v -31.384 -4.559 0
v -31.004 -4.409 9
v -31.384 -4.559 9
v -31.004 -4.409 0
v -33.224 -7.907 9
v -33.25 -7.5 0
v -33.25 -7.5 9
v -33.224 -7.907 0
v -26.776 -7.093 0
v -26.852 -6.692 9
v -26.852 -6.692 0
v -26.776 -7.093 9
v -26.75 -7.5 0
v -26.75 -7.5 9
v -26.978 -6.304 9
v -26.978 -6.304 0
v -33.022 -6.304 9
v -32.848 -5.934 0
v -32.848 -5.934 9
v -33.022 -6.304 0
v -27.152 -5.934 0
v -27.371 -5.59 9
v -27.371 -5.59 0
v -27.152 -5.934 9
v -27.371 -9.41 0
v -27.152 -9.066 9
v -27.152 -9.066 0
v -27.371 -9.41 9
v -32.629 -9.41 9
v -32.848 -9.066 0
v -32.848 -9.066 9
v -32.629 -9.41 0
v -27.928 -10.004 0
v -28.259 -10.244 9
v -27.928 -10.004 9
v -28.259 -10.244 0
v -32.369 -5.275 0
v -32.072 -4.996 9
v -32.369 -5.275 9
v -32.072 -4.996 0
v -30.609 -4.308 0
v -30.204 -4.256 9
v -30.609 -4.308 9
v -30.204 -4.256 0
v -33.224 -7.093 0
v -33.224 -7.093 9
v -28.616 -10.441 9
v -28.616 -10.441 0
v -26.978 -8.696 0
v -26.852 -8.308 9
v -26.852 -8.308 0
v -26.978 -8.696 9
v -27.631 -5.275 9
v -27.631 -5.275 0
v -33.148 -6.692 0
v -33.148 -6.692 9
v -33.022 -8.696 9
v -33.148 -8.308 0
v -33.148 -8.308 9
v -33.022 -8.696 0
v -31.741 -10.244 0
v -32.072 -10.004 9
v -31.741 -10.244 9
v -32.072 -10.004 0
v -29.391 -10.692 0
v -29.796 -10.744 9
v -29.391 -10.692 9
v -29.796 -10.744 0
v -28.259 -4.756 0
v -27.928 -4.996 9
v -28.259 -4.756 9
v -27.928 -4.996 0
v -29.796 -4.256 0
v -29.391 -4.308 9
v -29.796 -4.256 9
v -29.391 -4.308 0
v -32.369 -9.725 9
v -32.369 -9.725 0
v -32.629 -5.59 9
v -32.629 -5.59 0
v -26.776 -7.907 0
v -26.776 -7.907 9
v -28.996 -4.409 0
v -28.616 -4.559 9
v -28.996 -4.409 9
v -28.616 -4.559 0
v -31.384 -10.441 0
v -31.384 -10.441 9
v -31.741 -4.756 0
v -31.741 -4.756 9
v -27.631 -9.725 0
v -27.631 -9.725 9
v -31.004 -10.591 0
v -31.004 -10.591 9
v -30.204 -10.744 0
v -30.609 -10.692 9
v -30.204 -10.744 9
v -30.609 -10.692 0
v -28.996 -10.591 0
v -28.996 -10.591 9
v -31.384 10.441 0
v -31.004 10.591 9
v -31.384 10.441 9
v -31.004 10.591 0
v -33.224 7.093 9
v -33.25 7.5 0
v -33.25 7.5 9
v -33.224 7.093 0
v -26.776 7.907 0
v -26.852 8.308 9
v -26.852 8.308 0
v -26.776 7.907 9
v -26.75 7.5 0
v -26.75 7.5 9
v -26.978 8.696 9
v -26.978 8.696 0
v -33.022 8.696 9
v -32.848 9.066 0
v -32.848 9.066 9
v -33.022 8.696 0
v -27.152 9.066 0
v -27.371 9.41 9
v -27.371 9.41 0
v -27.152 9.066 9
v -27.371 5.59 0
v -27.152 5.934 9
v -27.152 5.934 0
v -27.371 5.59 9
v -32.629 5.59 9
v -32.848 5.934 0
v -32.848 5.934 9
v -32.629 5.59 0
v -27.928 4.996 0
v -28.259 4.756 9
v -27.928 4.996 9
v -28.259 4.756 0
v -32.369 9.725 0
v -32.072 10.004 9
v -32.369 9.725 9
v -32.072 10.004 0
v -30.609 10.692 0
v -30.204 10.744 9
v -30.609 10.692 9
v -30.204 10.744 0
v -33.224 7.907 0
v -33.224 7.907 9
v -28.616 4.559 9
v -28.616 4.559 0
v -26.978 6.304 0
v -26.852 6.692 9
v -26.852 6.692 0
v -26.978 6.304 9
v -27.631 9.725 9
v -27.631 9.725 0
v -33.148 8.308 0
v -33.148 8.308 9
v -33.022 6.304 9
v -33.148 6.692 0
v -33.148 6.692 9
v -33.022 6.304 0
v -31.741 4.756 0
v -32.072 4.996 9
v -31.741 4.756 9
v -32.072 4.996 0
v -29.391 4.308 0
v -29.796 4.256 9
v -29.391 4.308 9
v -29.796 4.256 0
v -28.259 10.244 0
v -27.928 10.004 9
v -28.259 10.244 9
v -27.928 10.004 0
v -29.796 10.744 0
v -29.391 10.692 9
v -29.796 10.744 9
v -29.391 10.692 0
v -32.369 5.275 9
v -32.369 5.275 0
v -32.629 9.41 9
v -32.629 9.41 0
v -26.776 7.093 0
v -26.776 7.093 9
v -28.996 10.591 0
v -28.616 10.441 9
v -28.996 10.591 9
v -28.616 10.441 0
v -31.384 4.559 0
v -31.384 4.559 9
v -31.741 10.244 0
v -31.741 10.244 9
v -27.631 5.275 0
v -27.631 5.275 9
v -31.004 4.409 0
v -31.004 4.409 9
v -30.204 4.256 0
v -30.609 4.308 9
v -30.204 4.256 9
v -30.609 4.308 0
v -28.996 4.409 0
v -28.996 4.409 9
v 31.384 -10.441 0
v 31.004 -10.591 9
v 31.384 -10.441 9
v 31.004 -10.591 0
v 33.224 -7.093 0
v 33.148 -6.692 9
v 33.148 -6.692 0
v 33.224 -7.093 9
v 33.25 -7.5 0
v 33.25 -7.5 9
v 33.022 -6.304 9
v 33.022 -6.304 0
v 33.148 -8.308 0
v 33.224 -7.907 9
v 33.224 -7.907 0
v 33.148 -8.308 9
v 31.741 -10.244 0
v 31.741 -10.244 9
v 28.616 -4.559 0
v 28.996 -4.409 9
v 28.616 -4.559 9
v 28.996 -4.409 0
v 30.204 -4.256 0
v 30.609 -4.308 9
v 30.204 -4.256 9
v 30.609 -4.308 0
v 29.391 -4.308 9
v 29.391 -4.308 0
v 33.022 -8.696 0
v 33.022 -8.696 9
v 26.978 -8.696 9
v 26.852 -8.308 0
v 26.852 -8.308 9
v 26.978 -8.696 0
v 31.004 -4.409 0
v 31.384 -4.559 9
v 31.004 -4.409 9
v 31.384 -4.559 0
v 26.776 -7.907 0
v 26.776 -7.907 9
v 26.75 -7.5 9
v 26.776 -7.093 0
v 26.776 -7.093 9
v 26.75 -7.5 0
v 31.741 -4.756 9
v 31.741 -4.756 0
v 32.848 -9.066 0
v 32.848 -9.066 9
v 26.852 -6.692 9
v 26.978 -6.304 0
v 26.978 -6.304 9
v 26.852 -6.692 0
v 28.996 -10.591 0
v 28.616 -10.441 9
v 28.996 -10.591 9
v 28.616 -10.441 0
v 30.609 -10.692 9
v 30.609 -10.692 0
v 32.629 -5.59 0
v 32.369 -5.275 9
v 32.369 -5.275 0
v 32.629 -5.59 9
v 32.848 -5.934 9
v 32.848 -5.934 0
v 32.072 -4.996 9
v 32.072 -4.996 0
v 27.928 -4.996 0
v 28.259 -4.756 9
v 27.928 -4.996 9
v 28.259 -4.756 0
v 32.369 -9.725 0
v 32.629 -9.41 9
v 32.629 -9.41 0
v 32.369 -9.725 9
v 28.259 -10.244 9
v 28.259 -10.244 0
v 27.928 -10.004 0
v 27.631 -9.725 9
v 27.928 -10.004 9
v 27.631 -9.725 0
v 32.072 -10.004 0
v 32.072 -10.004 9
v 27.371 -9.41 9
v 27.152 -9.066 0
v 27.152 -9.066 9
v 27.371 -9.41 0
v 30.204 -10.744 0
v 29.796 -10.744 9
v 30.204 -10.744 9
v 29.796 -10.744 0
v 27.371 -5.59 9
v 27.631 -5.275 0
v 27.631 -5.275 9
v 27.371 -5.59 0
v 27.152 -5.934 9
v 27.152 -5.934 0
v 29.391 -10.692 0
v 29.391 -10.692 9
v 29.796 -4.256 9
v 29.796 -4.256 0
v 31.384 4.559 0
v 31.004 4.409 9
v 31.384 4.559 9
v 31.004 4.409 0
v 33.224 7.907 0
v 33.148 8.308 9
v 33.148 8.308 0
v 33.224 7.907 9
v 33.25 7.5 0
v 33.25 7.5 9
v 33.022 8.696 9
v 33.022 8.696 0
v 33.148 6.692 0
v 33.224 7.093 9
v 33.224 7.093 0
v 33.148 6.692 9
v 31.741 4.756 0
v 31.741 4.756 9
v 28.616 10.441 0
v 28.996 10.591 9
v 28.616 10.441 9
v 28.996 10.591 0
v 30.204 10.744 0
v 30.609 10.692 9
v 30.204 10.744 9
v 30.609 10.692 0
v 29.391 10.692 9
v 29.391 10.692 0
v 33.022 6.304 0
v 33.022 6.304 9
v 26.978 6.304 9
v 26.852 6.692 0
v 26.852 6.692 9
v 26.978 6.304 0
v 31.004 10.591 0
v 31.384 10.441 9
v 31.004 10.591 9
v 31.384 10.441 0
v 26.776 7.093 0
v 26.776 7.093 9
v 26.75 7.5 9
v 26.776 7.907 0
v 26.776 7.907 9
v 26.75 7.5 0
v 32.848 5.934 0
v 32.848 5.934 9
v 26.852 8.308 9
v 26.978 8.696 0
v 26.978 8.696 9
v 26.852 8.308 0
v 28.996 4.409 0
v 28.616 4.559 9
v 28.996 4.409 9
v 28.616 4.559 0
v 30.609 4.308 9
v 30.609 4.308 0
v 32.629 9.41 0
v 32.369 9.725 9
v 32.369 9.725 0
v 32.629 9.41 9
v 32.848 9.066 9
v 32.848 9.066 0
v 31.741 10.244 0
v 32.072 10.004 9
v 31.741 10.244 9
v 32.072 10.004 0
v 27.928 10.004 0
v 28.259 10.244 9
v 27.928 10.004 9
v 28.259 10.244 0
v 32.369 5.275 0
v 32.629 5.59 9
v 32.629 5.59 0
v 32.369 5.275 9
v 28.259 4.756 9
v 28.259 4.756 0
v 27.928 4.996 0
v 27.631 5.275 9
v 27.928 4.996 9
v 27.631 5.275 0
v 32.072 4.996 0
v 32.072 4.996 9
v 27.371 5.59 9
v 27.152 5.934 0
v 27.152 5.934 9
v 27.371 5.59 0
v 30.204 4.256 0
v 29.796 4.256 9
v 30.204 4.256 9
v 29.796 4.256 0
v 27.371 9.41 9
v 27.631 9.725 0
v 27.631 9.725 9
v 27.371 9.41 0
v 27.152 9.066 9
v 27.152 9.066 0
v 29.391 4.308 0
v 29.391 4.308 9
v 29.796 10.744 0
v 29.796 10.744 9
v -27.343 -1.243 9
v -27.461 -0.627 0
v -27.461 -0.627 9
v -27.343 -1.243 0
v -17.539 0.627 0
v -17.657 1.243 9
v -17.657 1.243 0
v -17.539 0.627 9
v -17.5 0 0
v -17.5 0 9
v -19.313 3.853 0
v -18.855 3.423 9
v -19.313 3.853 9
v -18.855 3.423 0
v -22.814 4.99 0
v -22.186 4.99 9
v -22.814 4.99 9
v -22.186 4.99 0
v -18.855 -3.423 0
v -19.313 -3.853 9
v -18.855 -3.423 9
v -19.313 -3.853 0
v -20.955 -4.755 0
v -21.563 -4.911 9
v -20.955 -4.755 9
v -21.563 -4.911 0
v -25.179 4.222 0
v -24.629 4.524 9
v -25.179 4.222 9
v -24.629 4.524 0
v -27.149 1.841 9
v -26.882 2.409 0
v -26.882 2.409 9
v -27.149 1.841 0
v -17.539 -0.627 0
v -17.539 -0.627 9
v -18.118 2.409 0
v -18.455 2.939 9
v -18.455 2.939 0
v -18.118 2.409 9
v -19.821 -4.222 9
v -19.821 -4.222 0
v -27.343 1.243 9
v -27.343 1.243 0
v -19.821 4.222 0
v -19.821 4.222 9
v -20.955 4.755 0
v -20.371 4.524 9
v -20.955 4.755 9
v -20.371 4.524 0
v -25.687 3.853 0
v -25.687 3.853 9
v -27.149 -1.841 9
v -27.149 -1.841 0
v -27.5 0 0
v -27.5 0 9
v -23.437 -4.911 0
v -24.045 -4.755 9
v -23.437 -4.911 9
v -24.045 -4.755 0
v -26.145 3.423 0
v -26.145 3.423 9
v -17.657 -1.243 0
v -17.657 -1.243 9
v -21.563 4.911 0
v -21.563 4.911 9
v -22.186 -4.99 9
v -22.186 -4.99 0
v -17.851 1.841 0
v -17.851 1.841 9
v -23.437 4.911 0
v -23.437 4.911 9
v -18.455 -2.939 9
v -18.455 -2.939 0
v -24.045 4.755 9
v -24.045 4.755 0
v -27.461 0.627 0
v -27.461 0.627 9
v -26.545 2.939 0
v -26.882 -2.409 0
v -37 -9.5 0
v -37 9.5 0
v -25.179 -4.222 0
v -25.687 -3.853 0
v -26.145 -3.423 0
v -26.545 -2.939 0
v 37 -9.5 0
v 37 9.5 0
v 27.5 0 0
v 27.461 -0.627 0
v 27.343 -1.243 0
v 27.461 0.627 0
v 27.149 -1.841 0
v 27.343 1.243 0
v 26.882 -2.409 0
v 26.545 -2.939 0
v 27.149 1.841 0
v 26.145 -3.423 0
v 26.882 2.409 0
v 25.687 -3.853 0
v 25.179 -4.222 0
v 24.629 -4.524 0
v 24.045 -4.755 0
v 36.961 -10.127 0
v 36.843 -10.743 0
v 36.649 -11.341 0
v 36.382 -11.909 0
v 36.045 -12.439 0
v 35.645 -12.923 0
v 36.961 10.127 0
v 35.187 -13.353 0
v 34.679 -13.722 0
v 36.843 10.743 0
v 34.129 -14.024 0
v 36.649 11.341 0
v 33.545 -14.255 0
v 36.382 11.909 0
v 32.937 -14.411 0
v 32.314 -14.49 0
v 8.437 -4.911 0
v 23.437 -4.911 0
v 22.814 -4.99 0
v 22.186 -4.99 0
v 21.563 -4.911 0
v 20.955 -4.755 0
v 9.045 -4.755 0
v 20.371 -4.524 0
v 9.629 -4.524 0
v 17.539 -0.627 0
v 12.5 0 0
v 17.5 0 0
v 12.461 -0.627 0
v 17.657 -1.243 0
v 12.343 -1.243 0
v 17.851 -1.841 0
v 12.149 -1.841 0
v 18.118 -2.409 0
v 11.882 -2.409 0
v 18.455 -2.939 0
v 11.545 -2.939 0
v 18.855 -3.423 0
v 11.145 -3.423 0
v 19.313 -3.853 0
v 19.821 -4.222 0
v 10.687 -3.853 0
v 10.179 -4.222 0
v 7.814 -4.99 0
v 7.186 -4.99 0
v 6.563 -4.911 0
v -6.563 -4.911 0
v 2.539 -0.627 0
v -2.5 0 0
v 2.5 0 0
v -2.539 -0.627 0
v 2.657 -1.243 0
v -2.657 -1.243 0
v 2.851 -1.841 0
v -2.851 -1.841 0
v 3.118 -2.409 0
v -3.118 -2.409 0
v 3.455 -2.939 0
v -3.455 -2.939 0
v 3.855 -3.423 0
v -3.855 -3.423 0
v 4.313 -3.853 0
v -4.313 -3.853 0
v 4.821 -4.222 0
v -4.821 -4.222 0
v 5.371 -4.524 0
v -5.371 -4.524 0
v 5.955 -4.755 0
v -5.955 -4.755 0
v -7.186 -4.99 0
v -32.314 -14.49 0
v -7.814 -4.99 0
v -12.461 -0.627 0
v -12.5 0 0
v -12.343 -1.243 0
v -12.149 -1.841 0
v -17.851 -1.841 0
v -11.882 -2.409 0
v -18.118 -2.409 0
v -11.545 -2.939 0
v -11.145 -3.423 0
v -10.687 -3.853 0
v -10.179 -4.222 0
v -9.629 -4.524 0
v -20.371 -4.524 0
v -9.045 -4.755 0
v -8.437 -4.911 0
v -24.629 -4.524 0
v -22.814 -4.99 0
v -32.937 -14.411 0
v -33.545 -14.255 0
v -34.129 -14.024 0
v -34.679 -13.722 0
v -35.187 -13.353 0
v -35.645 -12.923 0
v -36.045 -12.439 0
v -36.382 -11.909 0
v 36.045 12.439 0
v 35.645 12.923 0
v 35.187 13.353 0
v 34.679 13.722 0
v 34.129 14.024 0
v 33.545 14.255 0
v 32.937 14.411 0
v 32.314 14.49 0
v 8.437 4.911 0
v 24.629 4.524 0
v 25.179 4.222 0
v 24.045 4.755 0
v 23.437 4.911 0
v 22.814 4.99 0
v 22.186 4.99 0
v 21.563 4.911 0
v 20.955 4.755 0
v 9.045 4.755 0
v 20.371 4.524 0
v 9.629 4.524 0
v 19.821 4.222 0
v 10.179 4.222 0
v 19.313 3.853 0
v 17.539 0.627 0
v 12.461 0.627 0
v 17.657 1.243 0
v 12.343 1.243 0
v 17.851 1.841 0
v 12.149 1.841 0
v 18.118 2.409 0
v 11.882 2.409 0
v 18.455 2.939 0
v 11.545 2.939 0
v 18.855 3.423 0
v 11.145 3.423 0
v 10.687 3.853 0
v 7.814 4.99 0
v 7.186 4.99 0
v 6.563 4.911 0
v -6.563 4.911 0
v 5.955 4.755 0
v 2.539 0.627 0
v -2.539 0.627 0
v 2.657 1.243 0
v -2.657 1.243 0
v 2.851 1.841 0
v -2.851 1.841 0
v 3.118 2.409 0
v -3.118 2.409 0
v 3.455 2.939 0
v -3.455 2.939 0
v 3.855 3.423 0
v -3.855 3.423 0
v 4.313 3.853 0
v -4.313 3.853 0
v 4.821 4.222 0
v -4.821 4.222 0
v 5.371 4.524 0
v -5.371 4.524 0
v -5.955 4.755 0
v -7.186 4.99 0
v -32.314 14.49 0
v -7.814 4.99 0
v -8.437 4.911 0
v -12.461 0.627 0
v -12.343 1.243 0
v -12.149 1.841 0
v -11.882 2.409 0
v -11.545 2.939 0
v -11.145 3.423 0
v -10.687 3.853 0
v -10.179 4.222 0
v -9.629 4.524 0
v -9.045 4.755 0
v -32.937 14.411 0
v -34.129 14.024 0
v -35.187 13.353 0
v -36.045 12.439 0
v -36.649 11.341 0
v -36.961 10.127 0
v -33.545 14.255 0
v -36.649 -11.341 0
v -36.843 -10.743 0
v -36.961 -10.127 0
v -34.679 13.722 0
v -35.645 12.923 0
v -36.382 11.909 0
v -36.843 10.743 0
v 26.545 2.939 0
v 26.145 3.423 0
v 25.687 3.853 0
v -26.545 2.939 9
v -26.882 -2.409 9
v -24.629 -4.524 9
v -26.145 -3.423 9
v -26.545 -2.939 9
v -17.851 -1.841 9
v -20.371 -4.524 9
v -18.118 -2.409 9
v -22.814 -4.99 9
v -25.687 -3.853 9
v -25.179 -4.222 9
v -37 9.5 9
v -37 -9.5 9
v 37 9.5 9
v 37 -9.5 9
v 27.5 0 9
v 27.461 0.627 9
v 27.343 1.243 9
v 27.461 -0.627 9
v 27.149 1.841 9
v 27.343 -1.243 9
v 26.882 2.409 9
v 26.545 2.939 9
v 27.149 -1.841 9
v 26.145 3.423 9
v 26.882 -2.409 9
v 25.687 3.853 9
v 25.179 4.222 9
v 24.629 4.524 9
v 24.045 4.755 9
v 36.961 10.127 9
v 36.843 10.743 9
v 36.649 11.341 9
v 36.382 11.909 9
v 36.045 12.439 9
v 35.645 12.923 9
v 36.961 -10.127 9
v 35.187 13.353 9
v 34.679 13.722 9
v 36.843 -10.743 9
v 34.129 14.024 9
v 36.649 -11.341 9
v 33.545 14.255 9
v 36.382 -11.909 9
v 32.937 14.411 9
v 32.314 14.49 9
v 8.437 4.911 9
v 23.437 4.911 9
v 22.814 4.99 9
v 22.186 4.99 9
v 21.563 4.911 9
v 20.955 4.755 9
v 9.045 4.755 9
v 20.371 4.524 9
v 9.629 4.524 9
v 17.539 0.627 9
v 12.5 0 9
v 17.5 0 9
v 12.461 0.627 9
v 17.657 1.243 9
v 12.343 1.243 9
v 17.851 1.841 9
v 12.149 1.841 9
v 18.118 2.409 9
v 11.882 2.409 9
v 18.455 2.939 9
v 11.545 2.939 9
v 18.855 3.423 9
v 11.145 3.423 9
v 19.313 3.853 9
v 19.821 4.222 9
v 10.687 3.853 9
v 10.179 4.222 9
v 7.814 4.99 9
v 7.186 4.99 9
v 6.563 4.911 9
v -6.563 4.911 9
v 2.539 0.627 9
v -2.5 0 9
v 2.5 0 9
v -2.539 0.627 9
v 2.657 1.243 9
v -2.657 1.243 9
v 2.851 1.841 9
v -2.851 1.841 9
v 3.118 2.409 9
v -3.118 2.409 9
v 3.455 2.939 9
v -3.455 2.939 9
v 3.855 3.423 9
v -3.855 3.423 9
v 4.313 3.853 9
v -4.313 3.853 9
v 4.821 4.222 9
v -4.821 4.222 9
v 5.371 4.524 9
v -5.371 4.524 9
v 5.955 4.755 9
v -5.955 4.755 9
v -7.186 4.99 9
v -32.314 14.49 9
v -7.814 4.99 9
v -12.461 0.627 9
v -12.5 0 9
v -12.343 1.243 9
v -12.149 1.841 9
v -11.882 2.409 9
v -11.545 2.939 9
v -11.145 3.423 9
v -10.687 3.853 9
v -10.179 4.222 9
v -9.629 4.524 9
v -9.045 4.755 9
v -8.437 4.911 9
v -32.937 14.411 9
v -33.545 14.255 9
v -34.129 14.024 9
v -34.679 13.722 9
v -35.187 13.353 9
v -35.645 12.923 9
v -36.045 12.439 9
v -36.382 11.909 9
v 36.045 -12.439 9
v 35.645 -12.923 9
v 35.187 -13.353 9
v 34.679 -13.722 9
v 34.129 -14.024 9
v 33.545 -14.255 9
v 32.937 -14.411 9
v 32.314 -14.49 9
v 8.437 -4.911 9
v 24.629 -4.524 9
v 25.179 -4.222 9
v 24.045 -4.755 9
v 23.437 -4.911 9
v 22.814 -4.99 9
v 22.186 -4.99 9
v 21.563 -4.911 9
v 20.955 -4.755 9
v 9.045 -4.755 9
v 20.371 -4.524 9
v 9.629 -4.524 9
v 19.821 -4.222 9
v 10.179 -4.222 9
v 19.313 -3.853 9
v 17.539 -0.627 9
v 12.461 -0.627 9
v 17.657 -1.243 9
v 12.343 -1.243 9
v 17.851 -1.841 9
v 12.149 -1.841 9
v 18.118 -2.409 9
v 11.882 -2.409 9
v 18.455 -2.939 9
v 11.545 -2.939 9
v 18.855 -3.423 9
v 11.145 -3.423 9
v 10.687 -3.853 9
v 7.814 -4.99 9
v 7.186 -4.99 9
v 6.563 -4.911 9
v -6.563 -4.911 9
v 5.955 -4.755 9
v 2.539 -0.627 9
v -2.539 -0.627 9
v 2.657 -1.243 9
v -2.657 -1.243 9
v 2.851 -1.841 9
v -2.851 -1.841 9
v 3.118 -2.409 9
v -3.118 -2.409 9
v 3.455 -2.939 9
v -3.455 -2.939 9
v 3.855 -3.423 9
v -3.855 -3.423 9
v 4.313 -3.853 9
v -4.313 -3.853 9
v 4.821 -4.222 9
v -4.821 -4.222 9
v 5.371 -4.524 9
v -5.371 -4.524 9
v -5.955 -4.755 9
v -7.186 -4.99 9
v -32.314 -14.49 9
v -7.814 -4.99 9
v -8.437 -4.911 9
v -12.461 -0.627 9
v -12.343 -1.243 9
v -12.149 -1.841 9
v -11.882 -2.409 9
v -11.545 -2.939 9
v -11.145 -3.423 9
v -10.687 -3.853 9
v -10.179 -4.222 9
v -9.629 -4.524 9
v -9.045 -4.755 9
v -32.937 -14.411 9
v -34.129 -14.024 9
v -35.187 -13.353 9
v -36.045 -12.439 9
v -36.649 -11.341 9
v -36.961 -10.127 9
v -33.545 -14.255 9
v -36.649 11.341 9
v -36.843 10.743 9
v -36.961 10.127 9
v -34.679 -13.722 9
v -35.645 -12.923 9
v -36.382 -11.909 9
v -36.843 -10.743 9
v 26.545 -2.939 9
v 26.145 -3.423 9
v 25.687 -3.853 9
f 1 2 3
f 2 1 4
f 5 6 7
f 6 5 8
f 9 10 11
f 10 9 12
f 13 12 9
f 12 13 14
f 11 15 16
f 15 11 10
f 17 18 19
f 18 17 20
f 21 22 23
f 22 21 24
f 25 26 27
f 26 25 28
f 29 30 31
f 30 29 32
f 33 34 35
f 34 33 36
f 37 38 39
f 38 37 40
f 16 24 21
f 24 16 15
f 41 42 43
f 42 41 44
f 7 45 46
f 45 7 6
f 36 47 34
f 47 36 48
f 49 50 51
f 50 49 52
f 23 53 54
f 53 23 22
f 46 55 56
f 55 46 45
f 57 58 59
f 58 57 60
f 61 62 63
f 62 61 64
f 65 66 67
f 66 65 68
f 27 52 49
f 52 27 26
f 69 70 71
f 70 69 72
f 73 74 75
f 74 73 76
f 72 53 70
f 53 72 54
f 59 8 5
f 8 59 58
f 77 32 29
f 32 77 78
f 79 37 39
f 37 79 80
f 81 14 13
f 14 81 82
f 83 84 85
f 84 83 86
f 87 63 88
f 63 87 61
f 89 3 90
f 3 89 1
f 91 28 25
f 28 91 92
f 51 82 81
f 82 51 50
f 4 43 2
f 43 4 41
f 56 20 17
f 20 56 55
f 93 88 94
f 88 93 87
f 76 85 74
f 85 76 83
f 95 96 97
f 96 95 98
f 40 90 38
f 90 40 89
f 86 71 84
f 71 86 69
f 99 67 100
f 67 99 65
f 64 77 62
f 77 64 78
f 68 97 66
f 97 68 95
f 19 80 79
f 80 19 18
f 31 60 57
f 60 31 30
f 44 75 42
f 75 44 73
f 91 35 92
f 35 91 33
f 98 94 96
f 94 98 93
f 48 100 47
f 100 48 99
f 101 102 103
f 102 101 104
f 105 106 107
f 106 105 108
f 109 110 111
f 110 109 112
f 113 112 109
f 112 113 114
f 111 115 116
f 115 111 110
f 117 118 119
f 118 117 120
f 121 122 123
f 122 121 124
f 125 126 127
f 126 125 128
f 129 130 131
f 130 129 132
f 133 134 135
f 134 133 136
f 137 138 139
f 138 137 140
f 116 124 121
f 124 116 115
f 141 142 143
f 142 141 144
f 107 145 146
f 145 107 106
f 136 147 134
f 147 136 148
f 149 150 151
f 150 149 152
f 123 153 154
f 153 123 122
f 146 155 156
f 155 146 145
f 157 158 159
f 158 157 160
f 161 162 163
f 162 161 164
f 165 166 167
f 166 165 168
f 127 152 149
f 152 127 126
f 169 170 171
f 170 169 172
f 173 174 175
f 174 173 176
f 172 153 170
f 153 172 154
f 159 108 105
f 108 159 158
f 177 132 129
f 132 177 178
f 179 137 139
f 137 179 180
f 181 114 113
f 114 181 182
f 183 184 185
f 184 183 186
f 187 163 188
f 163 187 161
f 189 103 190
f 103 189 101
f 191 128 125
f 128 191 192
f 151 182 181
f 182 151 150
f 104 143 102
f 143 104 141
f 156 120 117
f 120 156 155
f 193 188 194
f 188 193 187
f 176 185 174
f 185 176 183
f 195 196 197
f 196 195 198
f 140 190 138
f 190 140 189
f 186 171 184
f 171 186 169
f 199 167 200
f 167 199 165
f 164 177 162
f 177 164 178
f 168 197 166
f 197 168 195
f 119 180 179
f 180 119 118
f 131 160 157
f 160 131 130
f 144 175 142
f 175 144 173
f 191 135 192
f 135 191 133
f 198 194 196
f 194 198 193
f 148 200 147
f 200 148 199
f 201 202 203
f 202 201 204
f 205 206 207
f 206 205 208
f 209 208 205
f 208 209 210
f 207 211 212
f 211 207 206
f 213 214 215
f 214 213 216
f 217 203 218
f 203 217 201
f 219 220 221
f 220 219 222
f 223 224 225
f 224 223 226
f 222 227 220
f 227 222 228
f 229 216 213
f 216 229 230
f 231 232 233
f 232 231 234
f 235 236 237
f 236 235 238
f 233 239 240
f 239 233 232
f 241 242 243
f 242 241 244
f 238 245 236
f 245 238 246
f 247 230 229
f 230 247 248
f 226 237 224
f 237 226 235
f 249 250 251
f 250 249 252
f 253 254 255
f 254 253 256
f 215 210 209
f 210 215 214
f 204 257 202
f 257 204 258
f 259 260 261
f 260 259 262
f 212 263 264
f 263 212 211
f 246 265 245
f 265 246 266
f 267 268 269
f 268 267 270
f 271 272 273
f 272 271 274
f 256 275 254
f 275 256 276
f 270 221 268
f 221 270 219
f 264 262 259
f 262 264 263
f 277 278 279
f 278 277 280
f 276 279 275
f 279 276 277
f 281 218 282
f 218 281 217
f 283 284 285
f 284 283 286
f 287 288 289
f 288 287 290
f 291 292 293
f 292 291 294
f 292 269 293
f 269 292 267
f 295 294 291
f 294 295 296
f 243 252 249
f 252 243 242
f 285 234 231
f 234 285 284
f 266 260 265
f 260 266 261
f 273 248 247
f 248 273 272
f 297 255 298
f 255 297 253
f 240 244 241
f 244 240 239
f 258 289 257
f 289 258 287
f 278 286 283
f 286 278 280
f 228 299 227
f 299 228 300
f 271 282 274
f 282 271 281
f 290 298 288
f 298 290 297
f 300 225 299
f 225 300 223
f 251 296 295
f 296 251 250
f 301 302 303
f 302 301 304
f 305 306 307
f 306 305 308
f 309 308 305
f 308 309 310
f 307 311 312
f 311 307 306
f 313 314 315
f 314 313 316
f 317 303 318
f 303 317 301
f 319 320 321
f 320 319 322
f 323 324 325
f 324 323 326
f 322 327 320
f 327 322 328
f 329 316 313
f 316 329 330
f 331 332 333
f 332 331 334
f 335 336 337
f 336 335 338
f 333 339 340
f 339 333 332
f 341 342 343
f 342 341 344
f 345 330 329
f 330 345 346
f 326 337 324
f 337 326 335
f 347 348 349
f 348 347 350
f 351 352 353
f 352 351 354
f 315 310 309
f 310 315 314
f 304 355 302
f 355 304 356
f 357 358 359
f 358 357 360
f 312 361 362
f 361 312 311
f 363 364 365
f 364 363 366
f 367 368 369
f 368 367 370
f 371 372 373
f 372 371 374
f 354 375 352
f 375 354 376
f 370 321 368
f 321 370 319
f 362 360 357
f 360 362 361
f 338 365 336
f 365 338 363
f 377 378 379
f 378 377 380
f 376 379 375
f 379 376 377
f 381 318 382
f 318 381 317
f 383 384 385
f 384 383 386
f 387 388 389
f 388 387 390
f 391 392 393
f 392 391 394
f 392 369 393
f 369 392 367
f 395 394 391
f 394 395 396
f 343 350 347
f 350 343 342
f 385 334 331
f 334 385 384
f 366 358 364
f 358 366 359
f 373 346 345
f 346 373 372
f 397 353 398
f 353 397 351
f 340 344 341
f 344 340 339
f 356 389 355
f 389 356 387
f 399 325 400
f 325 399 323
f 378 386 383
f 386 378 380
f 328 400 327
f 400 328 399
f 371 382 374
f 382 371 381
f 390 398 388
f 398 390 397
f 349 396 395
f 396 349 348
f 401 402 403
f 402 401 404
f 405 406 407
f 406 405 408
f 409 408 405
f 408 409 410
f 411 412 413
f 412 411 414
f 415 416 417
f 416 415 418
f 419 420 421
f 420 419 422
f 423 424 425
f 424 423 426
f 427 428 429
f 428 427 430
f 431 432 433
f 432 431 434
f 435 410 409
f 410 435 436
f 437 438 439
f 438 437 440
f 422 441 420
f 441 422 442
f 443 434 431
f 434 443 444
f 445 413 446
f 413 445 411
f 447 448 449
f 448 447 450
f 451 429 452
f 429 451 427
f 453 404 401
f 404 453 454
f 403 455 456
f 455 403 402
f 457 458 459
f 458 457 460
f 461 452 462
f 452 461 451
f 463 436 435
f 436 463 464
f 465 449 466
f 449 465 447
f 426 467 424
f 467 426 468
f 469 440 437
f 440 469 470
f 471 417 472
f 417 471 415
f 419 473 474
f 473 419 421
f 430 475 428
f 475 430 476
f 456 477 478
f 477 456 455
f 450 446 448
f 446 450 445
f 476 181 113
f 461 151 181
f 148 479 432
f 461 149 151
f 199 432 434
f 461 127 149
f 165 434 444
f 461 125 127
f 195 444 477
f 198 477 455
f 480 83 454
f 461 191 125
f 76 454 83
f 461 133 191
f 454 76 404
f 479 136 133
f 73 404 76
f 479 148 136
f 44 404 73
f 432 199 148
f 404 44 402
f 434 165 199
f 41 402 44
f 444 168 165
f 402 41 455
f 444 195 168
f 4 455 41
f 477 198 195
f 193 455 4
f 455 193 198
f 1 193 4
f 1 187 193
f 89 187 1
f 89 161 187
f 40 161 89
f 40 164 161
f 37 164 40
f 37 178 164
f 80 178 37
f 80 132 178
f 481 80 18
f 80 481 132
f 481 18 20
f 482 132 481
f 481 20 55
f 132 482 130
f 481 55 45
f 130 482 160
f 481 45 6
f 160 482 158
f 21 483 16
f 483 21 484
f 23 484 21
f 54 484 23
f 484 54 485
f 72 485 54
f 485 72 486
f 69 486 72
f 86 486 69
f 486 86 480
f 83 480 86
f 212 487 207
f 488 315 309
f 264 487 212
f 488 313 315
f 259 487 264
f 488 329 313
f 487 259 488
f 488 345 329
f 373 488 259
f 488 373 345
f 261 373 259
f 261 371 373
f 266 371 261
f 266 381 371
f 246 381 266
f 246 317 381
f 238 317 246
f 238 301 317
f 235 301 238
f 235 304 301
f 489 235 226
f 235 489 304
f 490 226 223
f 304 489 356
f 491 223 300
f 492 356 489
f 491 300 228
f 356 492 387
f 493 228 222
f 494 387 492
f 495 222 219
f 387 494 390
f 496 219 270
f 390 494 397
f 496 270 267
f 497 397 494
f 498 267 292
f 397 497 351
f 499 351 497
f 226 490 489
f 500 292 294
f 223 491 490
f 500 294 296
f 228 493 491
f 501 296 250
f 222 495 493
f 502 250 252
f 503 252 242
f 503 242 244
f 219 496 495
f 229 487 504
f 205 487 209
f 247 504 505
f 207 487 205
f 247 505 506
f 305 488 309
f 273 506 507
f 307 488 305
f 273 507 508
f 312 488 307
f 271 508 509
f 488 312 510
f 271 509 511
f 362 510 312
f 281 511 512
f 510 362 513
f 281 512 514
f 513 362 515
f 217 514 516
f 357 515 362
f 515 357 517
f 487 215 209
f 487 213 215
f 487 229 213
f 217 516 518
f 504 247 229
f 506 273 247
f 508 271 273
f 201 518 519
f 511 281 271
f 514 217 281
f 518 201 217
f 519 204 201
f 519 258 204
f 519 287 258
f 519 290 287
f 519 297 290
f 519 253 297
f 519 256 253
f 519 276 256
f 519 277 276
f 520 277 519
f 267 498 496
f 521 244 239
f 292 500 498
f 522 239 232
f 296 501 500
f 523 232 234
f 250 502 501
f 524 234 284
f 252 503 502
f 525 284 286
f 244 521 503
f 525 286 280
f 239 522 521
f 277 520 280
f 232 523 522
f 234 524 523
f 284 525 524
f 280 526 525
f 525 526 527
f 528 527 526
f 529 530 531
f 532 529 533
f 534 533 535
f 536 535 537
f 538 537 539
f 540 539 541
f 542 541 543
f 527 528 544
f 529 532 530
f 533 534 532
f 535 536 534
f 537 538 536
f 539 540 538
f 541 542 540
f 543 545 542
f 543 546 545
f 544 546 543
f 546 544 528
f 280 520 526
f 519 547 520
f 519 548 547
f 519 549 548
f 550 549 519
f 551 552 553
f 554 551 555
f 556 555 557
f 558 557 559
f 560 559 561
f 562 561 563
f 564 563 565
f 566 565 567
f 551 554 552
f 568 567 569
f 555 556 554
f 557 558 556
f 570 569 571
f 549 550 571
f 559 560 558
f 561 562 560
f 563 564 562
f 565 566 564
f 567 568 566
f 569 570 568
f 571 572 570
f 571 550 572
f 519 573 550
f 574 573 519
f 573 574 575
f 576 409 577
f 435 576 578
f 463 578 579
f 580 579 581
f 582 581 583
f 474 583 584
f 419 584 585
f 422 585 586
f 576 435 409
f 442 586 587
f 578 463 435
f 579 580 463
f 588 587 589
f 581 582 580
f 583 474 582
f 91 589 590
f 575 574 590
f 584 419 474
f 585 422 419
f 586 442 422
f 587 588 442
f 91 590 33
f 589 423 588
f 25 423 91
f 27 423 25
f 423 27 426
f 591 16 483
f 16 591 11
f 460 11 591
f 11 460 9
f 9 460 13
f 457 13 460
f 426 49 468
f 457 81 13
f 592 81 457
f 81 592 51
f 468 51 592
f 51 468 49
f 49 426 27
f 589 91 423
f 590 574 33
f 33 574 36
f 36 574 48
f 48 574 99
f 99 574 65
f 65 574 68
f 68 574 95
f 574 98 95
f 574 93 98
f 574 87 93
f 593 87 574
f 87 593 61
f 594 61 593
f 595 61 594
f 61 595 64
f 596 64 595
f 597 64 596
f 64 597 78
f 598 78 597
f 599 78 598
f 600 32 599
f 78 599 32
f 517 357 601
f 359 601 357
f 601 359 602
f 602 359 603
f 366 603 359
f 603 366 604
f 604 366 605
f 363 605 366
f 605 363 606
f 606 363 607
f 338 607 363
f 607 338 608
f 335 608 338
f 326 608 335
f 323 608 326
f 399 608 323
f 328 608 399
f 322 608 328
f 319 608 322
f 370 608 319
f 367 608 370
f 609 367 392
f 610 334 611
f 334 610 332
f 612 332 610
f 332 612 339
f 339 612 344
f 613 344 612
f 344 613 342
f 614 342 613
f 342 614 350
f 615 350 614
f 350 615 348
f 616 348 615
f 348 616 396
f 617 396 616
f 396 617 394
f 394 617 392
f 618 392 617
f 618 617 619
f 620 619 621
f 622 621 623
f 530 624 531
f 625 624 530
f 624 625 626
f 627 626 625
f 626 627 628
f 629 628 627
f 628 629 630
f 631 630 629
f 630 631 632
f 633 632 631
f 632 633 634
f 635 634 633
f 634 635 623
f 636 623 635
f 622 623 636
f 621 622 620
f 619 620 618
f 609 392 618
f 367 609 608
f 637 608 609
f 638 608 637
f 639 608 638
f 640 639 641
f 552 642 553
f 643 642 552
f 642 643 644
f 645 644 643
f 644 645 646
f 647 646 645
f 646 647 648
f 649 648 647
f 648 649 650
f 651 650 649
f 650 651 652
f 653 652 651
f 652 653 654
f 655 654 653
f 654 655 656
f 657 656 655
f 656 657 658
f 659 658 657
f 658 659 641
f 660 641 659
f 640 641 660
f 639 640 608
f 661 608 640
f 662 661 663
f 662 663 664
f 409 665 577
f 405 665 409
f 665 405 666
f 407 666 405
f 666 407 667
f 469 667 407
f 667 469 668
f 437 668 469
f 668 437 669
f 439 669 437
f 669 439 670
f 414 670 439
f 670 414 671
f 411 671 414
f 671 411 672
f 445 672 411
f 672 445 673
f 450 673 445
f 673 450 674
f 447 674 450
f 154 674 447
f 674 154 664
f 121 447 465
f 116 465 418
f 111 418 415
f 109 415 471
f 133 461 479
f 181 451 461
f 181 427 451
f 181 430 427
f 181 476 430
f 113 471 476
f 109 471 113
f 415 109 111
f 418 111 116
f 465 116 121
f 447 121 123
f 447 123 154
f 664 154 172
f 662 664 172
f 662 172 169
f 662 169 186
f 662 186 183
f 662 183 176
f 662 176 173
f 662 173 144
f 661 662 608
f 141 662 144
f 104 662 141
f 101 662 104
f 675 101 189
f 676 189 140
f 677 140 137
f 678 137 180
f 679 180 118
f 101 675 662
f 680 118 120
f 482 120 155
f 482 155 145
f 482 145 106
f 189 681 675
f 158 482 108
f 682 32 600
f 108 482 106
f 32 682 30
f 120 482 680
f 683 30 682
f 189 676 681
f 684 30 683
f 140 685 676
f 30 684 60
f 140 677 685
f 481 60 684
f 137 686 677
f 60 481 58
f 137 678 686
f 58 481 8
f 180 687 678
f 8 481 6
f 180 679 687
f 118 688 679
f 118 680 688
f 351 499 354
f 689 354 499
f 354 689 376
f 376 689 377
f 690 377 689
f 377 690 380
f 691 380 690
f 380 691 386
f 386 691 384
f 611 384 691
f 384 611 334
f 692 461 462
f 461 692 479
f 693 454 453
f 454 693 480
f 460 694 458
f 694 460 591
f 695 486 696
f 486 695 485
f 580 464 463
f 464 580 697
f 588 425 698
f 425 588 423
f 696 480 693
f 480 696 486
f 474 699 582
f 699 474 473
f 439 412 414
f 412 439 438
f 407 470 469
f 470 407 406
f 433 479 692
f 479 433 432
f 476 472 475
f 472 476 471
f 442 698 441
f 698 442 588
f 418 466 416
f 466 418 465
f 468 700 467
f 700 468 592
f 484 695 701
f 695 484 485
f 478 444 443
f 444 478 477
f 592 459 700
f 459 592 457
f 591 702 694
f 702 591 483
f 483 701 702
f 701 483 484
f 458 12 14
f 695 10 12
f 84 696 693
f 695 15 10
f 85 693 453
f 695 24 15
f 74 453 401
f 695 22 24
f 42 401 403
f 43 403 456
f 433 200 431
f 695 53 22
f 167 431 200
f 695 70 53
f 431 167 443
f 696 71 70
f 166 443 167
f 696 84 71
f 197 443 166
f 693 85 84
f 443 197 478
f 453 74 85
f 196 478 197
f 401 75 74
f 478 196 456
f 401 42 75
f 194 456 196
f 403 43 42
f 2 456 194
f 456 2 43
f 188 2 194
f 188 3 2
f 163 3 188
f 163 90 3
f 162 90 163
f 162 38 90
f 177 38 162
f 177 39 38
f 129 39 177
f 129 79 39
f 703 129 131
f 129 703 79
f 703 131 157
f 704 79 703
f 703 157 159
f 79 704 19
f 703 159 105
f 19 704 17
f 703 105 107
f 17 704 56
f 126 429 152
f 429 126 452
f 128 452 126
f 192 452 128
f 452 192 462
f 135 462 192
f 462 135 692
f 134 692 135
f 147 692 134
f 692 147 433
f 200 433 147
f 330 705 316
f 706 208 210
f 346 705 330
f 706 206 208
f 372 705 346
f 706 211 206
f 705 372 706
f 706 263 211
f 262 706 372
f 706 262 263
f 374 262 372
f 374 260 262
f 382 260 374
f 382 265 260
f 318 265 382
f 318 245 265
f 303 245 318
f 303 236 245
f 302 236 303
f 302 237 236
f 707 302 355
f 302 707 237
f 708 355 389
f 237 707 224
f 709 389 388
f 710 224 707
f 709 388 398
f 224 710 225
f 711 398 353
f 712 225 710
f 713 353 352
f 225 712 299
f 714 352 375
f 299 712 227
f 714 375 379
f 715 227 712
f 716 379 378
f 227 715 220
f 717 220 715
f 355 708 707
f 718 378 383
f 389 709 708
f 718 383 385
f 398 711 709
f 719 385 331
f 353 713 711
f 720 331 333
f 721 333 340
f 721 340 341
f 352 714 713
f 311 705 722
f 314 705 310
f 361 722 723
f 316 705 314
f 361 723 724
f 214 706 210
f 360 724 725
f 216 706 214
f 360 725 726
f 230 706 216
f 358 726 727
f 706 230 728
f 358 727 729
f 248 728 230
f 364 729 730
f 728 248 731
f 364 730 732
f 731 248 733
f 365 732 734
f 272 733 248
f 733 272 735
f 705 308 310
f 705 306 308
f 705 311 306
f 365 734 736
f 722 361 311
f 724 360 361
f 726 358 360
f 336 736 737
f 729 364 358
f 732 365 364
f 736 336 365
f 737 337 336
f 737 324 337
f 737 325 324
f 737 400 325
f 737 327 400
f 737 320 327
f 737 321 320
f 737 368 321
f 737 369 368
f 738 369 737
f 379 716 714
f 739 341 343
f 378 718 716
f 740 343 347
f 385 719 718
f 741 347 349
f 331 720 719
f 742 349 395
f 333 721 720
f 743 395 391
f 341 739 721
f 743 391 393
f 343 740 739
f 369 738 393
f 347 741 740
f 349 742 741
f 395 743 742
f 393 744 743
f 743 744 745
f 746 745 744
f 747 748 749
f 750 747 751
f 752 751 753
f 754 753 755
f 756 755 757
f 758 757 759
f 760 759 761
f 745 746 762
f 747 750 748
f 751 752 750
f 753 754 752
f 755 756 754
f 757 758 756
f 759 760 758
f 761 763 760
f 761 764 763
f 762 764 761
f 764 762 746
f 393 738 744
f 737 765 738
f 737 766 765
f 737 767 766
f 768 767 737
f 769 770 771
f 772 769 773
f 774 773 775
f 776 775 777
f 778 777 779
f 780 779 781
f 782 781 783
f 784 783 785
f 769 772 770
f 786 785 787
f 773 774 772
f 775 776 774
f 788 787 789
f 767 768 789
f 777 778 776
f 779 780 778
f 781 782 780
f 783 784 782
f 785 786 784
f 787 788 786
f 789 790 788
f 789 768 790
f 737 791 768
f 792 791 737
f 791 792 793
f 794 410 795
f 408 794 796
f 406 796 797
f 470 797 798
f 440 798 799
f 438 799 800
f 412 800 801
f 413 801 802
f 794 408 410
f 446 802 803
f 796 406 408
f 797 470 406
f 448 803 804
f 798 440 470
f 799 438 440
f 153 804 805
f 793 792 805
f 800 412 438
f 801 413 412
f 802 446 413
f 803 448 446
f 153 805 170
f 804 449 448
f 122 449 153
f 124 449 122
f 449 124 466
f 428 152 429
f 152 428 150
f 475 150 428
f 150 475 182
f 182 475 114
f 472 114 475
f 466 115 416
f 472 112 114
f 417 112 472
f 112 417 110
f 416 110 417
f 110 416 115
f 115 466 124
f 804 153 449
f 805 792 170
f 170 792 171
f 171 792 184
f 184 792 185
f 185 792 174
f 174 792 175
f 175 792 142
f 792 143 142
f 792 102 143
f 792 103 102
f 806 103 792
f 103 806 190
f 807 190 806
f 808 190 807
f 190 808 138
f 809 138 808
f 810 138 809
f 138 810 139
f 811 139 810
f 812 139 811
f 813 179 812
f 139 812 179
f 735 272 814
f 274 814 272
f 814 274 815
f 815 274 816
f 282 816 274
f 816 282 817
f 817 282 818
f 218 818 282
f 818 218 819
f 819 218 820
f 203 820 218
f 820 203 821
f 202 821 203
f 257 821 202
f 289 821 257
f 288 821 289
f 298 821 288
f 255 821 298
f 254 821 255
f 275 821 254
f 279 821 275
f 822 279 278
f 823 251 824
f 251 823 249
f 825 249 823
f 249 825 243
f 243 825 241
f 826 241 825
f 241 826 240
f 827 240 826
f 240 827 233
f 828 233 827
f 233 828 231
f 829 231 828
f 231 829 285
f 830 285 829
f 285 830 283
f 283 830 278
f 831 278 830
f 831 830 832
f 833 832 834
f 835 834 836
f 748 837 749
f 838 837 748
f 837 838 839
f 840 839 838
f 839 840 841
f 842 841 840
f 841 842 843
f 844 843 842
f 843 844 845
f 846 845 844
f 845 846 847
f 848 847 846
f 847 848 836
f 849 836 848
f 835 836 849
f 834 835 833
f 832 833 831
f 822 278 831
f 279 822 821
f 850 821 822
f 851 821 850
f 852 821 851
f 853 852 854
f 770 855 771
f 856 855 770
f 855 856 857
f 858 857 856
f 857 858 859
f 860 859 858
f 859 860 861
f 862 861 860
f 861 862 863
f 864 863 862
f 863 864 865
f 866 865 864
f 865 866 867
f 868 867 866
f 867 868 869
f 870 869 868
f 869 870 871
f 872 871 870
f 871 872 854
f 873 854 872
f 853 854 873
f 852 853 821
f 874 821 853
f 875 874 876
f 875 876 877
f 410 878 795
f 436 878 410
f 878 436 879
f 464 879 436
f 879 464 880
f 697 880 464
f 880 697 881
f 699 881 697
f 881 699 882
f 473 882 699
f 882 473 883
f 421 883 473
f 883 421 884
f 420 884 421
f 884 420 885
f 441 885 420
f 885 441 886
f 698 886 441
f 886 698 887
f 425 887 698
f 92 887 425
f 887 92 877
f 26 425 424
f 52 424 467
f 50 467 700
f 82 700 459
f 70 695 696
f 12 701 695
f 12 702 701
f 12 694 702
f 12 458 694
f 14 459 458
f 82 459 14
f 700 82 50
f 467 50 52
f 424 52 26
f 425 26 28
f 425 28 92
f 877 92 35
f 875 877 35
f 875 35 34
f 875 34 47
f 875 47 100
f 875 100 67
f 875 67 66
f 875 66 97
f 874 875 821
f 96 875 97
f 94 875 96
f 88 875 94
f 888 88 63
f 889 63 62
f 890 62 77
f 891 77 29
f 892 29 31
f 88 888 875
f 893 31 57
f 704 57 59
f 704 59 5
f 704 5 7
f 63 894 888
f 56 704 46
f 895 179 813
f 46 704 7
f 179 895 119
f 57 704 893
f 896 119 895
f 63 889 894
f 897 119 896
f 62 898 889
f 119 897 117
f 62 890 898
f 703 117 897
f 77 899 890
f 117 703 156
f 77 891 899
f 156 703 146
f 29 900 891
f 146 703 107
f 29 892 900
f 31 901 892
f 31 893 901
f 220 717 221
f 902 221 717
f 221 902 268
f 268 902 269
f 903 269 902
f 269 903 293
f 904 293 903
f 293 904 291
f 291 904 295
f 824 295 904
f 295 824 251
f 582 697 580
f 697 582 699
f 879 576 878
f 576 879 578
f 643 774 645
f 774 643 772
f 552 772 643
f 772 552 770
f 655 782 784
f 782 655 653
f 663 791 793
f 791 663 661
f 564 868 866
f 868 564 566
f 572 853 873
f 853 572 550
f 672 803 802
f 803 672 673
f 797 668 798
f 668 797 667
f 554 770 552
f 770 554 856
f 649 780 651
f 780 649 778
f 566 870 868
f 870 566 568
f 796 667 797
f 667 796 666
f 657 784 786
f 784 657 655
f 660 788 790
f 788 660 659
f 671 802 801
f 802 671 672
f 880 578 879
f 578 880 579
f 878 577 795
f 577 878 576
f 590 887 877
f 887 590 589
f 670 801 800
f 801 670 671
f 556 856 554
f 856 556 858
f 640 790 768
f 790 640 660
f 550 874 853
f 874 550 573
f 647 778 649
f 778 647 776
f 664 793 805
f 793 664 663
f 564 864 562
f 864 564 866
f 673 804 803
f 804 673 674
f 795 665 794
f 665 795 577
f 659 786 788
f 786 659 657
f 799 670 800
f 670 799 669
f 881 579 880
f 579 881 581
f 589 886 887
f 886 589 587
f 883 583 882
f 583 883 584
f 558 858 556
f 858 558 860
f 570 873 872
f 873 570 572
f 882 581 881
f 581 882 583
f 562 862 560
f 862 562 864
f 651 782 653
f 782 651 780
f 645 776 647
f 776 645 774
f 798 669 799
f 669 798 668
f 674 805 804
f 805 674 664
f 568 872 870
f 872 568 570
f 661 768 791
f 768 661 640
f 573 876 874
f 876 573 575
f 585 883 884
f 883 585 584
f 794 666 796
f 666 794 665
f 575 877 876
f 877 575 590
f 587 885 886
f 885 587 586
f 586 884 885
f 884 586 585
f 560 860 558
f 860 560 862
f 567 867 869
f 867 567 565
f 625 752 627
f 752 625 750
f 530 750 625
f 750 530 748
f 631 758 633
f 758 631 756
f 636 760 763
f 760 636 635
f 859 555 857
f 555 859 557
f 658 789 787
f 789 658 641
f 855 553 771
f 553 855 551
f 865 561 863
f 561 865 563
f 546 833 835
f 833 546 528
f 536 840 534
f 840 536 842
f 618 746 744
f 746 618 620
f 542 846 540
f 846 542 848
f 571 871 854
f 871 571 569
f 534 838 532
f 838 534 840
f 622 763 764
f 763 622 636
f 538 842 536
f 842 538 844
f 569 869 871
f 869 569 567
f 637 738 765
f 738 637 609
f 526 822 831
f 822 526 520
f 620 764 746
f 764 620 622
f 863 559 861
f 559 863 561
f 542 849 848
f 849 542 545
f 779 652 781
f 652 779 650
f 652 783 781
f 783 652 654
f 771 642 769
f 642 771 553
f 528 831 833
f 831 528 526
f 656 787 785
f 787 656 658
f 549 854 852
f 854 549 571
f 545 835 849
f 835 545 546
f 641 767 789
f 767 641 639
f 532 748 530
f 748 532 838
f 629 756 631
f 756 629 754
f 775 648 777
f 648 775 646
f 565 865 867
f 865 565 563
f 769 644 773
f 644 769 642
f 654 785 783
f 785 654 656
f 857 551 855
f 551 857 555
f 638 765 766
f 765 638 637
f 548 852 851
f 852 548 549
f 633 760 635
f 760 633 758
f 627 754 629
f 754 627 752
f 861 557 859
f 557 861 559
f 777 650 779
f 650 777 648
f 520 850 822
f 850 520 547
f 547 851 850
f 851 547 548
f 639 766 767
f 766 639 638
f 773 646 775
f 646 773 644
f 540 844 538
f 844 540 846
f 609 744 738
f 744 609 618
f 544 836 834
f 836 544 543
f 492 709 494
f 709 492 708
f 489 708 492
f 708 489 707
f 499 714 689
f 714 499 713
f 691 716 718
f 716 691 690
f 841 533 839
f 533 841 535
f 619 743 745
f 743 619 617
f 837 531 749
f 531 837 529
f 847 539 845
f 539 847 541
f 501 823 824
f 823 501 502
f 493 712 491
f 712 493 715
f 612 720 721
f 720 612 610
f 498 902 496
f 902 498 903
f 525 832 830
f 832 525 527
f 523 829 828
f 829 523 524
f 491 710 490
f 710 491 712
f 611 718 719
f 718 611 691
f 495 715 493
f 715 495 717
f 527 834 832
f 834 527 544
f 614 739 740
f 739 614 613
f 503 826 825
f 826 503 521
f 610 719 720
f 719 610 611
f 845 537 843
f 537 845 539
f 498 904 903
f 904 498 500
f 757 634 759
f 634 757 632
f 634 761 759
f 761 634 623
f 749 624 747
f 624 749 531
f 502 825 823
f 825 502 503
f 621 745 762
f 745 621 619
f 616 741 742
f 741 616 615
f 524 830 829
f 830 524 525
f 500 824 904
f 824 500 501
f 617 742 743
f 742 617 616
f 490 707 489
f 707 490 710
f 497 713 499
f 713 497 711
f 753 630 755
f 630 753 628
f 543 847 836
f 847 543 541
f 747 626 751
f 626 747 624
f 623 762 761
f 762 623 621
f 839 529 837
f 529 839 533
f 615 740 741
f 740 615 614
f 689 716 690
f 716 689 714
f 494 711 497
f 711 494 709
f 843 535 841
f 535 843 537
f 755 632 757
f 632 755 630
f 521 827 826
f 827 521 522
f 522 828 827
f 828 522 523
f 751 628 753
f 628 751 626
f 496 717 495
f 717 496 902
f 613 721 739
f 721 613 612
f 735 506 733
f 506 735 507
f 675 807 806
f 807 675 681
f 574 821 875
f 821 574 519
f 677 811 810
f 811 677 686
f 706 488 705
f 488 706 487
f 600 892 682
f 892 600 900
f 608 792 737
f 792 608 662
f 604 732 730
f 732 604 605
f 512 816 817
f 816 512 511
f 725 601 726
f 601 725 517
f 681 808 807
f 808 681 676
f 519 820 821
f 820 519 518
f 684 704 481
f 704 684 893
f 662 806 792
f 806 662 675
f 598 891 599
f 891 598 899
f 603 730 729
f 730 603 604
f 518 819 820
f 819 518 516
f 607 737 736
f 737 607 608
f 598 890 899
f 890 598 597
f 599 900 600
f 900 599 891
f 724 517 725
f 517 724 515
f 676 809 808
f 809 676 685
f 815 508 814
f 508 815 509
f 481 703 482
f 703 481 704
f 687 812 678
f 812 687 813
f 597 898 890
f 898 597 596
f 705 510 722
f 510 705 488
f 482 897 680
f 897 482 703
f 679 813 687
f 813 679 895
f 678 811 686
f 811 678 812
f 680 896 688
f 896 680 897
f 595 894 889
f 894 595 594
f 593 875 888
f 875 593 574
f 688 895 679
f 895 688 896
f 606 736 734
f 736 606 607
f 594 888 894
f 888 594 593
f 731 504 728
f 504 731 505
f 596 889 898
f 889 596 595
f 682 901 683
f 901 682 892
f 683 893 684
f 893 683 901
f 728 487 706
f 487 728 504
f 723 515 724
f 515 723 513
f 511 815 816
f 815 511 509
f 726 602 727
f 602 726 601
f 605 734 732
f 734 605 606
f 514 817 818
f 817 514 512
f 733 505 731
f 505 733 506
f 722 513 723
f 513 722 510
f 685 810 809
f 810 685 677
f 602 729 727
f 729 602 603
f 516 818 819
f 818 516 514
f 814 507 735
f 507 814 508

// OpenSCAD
$fn = 50;


difference() {
	union() {
		hull() {
			translate(v = [-32.0000000000, 9.5000000000, 0]) {
				cylinder(h = 9, r = 5);
			}
			translate(v = [32.0000000000, 9.5000000000, 0]) {
				cylinder(h = 9, r = 5);
			}
			translate(v = [-32.0000000000, -9.5000000000, 0]) {
				cylinder(h = 9, r = 5);
			}
			translate(v = [32.0000000000, -9.5000000000, 0]) {
				cylinder(h = 9, r = 5);
			}
		}
	}
	union() {
		#translate(v = [-30.0000000000, -7.5000000000, -100.0000000000]) {
			cylinder(h = 200, r = 3.2500000000);
		}
		#translate(v = [-30.0000000000, 7.5000000000, -100.0000000000]) {
			cylinder(h = 200, r = 3.2500000000);
		}
		#translate(v = [30.0000000000, -7.5000000000, -100.0000000000]) {
			cylinder(h = 200, r = 3.2500000000);
		}
		#translate(v = [30.0000000000, 7.5000000000, -100.0000000000]) {
			cylinder(h = 200, r = 3.2500000000);
		}
		#translate(v = [-22.5000000000, 0, 0]) {
			cylinder(h = 9, r = 5.0000000000);
		}
		#translate(v = [-7.5000000000, 0, 0]) {
			cylinder(h = 9, r = 5.0000000000);
		}
		#translate(v = [7.5000000000, 0, 0]) {
			cylinder(h = 9, r = 5.0000000000);
		}
		#translate(v = [22.5000000000, 0, 0]) {
			cylinder(h = 9, r = 5.0000000000);
		}
	}
}
